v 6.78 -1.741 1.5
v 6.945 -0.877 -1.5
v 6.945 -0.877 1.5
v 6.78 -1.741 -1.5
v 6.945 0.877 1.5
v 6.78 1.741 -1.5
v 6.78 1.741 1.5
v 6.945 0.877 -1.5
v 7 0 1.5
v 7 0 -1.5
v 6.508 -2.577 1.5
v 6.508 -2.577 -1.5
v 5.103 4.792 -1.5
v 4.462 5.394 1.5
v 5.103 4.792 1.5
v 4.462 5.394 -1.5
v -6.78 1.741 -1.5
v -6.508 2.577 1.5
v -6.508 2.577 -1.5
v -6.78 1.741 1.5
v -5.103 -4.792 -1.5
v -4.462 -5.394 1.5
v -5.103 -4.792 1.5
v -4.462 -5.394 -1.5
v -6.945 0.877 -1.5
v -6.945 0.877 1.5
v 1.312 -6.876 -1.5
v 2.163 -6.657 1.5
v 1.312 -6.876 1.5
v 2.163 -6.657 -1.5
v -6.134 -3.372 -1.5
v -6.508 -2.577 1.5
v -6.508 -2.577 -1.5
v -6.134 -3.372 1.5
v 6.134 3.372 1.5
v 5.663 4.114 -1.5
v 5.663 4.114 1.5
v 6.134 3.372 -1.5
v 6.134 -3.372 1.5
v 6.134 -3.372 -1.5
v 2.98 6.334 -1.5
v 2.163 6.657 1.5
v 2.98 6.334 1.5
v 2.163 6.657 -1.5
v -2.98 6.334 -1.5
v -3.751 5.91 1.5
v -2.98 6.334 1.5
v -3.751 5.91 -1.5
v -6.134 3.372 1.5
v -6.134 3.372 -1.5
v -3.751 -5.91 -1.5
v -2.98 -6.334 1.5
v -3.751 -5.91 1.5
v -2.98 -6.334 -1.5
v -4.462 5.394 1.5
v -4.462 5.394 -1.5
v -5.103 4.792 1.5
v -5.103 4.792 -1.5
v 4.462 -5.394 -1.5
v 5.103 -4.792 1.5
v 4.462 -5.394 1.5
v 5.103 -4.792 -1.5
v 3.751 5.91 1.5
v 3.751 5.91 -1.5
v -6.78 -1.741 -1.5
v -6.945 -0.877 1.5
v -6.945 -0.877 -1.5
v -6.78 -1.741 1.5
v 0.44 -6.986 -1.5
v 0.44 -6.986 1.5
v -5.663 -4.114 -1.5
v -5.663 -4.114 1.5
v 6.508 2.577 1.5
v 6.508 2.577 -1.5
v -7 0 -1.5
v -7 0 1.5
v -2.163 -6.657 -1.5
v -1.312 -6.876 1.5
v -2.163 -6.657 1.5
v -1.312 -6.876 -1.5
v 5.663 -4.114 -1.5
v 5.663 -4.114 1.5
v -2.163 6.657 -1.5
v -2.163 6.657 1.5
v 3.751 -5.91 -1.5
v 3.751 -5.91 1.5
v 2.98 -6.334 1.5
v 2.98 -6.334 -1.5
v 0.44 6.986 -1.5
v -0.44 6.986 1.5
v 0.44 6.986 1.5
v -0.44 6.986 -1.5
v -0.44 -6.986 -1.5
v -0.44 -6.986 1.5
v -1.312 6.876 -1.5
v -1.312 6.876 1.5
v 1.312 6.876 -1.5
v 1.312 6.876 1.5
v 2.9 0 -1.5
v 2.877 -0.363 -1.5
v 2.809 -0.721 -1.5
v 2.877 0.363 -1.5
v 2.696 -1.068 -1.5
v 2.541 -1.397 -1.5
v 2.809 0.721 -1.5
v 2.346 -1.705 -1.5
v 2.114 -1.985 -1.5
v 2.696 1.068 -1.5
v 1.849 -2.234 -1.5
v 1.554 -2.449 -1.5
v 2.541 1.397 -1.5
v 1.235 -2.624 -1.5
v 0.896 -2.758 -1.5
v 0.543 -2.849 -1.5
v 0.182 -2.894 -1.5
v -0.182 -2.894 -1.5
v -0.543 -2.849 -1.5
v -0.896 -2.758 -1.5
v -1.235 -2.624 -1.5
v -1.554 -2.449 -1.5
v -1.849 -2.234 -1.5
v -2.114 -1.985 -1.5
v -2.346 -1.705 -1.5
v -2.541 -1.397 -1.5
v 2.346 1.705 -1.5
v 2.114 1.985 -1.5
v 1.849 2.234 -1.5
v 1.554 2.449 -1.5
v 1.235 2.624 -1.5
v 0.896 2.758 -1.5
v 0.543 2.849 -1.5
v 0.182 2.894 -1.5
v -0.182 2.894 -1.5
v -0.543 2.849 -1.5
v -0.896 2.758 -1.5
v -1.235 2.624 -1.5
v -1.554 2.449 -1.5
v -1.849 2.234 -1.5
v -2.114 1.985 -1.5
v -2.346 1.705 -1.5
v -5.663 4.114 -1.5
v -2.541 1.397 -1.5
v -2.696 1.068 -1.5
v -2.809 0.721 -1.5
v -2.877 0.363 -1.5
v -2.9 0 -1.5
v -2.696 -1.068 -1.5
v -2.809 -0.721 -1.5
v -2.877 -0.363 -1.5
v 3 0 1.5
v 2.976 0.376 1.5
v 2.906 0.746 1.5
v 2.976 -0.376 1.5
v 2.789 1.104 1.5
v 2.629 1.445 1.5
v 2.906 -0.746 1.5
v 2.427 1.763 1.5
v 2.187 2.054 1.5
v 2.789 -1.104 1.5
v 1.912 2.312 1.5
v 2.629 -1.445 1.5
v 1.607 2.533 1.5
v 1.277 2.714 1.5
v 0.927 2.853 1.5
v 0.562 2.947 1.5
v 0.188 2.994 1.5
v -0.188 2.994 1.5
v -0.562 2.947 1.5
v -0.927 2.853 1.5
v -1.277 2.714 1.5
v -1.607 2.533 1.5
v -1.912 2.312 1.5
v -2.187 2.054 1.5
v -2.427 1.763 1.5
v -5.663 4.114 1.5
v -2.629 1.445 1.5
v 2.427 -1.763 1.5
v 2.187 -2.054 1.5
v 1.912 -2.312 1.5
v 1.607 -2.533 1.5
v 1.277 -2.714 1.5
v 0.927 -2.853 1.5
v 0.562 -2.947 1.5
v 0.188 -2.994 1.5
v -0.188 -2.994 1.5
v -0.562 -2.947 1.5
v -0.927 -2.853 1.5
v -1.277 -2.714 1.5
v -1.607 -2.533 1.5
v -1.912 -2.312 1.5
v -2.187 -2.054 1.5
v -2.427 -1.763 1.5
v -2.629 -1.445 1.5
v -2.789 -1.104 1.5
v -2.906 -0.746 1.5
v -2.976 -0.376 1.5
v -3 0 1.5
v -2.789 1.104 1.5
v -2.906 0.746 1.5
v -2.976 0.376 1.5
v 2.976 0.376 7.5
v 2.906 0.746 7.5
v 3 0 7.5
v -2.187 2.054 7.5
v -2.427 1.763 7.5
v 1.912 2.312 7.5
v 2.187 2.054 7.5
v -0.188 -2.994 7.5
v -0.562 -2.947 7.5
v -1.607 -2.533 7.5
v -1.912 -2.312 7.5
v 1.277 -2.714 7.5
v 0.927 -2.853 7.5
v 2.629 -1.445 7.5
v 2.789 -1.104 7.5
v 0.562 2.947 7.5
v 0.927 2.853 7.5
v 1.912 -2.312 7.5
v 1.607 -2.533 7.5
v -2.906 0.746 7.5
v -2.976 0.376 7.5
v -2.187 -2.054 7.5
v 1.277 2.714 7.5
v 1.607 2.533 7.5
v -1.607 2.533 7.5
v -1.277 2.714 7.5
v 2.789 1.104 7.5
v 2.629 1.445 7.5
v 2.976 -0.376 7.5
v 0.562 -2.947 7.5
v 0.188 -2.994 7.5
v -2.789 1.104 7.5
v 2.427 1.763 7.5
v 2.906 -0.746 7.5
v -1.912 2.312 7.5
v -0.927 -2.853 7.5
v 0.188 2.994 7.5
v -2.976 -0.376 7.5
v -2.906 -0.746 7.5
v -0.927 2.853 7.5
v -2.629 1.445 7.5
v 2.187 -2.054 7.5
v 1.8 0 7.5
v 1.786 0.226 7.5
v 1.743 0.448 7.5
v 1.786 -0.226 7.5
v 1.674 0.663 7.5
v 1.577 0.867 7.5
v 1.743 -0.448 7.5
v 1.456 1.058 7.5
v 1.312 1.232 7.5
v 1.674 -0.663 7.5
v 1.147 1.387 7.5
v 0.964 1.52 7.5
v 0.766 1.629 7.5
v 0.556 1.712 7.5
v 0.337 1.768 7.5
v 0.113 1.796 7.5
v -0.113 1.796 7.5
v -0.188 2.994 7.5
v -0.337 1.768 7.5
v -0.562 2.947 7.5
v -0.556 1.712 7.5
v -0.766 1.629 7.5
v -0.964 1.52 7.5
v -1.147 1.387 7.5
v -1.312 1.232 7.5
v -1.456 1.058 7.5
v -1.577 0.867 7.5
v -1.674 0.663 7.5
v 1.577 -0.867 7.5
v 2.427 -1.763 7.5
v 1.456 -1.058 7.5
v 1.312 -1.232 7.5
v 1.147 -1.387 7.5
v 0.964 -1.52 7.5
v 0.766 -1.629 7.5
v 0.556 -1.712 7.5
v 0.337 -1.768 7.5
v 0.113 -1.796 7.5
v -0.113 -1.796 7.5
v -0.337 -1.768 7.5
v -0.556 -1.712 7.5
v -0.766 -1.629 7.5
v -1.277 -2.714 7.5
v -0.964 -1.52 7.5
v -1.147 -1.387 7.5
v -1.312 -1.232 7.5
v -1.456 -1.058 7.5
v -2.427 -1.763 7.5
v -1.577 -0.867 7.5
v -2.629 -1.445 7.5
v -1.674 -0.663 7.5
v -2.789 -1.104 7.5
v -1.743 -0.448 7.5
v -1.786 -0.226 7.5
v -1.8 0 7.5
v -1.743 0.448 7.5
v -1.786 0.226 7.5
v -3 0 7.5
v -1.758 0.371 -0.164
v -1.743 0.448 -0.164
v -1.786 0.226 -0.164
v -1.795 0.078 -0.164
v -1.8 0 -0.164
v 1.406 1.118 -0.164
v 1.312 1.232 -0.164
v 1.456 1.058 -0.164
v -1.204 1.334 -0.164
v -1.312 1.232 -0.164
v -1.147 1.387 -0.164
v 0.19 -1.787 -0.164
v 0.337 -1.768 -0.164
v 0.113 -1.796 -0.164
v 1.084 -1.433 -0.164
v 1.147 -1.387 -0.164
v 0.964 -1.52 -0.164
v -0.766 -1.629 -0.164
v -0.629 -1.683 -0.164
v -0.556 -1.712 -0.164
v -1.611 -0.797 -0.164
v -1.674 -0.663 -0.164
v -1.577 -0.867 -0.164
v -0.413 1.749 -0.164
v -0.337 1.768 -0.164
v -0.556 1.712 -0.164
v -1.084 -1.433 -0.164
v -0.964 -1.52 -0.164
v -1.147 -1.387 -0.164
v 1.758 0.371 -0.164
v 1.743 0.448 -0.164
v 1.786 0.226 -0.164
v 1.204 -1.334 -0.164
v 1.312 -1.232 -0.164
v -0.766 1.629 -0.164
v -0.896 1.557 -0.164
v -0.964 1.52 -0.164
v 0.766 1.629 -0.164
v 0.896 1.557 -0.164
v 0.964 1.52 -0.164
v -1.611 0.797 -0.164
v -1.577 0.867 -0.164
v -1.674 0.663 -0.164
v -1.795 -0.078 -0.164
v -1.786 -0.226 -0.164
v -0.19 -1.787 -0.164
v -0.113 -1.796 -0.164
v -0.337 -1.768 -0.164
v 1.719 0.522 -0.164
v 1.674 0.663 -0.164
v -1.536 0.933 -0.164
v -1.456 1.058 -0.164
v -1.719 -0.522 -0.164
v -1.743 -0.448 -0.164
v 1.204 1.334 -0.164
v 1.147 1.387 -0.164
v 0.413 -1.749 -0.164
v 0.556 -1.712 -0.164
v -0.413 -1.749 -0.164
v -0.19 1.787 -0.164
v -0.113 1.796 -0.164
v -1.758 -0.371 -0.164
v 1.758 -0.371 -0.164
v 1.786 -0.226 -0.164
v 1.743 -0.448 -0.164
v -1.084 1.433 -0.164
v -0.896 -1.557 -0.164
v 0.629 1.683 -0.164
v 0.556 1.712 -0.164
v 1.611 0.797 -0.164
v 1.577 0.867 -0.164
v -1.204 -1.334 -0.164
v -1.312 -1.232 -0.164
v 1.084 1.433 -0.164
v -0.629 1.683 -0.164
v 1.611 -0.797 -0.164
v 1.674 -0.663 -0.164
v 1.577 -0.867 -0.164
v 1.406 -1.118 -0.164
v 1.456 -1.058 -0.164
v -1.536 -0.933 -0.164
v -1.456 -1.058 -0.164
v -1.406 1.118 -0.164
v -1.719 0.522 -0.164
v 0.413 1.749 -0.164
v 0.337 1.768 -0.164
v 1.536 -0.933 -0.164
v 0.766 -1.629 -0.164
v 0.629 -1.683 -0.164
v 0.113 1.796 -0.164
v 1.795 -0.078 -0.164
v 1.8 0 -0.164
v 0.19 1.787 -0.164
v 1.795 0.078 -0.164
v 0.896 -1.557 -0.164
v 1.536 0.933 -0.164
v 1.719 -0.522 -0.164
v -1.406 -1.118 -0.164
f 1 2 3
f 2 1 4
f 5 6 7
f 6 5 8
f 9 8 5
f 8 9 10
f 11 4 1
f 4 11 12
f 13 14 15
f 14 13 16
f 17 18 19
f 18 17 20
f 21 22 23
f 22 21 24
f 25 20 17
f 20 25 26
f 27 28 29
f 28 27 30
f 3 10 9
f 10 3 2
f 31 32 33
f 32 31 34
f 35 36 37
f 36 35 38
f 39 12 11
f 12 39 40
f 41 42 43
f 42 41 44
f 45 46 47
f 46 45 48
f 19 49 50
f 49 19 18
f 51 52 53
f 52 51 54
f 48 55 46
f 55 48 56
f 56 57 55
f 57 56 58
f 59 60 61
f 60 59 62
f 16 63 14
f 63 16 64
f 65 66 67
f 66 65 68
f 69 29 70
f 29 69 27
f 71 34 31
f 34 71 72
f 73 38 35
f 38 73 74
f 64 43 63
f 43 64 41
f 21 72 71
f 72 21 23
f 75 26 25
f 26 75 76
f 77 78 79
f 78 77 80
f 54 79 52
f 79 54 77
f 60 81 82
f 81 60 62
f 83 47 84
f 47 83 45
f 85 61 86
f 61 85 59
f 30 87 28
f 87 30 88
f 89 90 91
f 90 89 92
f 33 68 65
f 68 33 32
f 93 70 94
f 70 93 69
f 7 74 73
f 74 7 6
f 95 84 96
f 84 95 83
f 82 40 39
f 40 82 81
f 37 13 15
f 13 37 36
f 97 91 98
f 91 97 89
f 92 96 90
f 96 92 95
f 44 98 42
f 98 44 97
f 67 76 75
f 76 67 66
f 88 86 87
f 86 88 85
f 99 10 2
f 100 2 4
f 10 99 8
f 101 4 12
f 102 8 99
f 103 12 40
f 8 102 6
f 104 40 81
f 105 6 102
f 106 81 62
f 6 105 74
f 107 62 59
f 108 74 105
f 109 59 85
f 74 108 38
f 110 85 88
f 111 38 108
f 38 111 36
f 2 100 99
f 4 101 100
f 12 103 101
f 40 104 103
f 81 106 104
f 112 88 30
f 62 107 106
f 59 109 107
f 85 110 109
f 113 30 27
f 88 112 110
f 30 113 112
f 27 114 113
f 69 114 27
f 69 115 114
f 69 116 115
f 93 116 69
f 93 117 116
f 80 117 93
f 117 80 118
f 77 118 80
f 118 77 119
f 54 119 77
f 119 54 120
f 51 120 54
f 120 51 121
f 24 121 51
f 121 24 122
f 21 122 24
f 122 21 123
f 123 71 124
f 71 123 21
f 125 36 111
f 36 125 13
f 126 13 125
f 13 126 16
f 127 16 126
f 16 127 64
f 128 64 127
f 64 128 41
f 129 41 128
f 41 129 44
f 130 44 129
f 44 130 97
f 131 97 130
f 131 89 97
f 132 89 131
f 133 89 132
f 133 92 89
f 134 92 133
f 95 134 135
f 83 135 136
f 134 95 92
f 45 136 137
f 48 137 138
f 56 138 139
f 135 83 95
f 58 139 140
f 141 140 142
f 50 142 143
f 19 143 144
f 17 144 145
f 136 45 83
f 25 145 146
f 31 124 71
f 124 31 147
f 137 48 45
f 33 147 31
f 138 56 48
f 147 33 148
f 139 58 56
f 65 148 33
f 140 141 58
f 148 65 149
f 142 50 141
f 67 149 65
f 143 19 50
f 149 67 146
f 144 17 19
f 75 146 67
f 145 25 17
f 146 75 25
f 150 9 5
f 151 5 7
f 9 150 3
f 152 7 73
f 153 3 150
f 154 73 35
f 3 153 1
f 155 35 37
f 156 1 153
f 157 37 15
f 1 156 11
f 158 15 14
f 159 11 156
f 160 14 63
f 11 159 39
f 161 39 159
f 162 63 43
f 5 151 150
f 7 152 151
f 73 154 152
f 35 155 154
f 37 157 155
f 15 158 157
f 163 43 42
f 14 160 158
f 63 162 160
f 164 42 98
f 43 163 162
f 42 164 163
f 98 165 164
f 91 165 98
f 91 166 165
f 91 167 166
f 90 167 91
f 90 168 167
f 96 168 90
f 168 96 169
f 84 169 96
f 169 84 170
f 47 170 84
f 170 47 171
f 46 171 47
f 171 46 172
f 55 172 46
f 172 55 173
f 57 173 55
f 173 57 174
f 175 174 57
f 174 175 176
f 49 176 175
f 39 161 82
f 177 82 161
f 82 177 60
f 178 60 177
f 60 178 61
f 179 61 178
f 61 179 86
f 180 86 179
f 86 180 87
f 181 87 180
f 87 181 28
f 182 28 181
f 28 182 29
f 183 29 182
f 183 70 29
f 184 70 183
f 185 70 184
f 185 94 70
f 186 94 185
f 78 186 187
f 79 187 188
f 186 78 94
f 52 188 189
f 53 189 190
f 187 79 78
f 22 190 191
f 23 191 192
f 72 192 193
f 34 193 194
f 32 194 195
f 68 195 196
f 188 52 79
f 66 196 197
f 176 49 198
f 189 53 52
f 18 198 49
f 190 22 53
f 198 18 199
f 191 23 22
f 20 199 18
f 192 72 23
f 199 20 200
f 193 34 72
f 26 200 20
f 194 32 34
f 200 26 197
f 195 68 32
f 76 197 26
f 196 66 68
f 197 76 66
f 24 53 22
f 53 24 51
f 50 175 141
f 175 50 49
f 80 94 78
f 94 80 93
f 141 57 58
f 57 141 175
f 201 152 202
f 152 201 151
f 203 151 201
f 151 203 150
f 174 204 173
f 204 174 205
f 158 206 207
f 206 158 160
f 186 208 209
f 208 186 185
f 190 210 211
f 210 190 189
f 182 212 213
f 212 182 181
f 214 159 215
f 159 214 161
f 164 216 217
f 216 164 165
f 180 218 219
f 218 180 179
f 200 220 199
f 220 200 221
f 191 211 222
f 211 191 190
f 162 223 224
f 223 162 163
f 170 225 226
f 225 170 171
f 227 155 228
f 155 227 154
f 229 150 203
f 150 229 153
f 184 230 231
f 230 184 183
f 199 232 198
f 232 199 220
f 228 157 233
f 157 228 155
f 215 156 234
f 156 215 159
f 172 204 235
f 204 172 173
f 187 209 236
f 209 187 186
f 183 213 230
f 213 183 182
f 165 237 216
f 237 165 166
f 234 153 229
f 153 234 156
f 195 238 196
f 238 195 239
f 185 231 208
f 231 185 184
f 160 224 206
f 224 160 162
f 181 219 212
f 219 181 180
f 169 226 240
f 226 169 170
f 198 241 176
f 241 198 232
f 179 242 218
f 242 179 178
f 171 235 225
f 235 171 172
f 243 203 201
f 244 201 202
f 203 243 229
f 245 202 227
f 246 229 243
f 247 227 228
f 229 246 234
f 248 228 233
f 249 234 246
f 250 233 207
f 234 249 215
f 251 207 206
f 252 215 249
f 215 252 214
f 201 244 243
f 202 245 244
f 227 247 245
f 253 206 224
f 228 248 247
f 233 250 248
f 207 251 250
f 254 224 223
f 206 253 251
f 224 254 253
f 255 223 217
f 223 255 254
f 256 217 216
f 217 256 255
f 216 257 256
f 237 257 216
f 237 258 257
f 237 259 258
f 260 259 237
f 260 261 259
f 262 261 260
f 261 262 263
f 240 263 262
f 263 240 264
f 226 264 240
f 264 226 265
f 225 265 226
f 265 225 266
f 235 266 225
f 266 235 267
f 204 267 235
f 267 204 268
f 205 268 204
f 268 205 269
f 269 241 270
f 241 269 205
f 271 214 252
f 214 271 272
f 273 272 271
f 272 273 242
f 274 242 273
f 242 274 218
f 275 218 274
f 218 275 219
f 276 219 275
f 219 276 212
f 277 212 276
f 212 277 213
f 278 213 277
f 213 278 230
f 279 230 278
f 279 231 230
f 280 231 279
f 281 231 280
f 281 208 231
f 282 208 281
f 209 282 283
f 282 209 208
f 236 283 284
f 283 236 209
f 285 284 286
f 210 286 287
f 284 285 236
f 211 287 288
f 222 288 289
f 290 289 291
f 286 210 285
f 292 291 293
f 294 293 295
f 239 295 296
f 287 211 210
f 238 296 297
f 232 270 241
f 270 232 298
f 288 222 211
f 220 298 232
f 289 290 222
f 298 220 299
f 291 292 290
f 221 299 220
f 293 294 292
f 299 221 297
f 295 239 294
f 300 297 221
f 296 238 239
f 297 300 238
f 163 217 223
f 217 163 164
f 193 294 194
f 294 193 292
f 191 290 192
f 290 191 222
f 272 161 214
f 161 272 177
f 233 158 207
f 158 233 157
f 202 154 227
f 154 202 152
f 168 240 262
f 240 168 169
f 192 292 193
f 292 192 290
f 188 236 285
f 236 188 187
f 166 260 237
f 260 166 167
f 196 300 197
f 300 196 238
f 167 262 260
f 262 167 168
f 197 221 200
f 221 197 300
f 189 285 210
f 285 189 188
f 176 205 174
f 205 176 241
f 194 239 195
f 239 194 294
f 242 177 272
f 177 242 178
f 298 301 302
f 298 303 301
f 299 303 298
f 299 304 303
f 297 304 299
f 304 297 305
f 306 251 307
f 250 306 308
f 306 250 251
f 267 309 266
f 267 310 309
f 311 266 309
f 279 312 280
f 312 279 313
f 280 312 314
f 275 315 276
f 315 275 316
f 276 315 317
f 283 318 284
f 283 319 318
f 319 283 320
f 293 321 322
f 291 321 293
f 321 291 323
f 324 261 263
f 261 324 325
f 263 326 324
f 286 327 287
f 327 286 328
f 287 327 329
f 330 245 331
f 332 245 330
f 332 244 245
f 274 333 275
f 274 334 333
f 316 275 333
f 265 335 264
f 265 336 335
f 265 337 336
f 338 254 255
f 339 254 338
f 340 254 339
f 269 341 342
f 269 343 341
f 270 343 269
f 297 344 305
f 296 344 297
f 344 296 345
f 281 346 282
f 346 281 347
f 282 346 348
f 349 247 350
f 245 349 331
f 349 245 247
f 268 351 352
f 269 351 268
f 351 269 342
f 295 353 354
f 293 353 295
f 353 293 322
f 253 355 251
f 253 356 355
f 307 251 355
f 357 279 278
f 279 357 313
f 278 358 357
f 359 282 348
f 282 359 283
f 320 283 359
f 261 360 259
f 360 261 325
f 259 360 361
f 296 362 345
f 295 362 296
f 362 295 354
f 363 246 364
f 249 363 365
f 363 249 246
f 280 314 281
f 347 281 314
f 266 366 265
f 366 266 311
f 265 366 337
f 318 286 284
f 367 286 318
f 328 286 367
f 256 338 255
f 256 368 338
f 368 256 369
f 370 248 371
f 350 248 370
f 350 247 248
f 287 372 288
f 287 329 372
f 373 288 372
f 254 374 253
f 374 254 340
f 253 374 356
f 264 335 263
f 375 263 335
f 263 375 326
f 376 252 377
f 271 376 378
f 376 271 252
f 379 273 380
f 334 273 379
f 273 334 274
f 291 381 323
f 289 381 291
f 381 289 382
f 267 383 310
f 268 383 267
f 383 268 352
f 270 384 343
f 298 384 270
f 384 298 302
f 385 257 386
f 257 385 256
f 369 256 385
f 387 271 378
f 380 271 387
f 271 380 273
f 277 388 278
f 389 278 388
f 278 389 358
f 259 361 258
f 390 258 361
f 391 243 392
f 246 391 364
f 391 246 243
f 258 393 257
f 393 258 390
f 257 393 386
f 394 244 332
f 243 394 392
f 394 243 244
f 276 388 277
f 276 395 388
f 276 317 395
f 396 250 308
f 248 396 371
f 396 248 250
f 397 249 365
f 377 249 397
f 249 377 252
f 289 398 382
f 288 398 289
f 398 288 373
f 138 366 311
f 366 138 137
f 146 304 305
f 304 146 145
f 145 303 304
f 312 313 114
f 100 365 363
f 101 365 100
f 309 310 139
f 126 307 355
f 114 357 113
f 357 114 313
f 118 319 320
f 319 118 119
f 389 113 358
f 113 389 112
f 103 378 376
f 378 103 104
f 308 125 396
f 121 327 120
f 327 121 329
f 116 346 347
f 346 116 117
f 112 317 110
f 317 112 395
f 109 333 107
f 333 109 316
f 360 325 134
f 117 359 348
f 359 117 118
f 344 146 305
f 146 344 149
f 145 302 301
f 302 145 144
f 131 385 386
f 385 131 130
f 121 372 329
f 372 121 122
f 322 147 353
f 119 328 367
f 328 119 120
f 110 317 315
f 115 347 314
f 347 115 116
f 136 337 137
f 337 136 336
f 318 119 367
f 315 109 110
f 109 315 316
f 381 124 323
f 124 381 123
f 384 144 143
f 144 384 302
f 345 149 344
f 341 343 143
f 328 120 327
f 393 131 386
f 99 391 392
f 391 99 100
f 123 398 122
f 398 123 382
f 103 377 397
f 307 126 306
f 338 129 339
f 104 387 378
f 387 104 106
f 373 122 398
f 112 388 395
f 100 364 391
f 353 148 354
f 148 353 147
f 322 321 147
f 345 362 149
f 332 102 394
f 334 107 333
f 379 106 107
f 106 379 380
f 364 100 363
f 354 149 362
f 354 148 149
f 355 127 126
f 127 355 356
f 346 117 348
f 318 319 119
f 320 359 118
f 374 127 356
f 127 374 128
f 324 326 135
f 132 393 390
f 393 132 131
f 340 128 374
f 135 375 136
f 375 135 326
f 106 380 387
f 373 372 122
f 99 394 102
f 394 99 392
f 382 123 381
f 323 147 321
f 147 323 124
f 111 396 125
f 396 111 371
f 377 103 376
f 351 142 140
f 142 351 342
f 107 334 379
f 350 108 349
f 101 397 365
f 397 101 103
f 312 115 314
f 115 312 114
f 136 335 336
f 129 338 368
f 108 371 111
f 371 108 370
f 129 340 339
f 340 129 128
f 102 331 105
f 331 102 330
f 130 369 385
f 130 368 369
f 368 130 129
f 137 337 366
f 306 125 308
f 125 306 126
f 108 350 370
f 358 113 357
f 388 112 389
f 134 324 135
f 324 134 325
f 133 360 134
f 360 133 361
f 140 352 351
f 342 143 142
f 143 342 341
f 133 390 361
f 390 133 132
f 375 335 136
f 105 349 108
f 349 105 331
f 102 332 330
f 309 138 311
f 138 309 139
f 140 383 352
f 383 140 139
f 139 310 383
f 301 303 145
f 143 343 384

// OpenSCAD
$fn = 50;


difference() {
	union() {
		translate(v = [0, 0, -1.5000000000]) {
			cylinder(h = 3, r = 7.0000000000);
		}
		translate(v = [0, 0, -1.5000000000]) {
			cylinder(h = 9, r = 3.0000000000);
		}
	}
	union() {
		translate(v = [0, 0, -1.5000000000]) {
			rotate(a = [0, 180, 0]) {
				difference() {
					union() {
						translate(v = [0, 0, -9.0000000000]) {
							cylinder(h = 9, r = 1.5000000000);
						}
						translate(v = [0, 0, -9.0000000000]) {
							cylinder(h = 9, r = 1.8000000000);
						}
						translate(v = [0, 0, -1.7000000000]) {
							cylinder(h = 1.7000000000, r1 = 1.5000000000, r2 = 2.9000000000);
						}
						translate(v = [0, 0, -9.0000000000]) {
							cylinder(h = 9, r = 1.5000000000);
						}
					}
					union();
				}
			}
		}
		translate(v = [0, 0, -50.0000000000]) {
			cylinder(h = 100, r = 1.5000000000);
		}
	}
}
